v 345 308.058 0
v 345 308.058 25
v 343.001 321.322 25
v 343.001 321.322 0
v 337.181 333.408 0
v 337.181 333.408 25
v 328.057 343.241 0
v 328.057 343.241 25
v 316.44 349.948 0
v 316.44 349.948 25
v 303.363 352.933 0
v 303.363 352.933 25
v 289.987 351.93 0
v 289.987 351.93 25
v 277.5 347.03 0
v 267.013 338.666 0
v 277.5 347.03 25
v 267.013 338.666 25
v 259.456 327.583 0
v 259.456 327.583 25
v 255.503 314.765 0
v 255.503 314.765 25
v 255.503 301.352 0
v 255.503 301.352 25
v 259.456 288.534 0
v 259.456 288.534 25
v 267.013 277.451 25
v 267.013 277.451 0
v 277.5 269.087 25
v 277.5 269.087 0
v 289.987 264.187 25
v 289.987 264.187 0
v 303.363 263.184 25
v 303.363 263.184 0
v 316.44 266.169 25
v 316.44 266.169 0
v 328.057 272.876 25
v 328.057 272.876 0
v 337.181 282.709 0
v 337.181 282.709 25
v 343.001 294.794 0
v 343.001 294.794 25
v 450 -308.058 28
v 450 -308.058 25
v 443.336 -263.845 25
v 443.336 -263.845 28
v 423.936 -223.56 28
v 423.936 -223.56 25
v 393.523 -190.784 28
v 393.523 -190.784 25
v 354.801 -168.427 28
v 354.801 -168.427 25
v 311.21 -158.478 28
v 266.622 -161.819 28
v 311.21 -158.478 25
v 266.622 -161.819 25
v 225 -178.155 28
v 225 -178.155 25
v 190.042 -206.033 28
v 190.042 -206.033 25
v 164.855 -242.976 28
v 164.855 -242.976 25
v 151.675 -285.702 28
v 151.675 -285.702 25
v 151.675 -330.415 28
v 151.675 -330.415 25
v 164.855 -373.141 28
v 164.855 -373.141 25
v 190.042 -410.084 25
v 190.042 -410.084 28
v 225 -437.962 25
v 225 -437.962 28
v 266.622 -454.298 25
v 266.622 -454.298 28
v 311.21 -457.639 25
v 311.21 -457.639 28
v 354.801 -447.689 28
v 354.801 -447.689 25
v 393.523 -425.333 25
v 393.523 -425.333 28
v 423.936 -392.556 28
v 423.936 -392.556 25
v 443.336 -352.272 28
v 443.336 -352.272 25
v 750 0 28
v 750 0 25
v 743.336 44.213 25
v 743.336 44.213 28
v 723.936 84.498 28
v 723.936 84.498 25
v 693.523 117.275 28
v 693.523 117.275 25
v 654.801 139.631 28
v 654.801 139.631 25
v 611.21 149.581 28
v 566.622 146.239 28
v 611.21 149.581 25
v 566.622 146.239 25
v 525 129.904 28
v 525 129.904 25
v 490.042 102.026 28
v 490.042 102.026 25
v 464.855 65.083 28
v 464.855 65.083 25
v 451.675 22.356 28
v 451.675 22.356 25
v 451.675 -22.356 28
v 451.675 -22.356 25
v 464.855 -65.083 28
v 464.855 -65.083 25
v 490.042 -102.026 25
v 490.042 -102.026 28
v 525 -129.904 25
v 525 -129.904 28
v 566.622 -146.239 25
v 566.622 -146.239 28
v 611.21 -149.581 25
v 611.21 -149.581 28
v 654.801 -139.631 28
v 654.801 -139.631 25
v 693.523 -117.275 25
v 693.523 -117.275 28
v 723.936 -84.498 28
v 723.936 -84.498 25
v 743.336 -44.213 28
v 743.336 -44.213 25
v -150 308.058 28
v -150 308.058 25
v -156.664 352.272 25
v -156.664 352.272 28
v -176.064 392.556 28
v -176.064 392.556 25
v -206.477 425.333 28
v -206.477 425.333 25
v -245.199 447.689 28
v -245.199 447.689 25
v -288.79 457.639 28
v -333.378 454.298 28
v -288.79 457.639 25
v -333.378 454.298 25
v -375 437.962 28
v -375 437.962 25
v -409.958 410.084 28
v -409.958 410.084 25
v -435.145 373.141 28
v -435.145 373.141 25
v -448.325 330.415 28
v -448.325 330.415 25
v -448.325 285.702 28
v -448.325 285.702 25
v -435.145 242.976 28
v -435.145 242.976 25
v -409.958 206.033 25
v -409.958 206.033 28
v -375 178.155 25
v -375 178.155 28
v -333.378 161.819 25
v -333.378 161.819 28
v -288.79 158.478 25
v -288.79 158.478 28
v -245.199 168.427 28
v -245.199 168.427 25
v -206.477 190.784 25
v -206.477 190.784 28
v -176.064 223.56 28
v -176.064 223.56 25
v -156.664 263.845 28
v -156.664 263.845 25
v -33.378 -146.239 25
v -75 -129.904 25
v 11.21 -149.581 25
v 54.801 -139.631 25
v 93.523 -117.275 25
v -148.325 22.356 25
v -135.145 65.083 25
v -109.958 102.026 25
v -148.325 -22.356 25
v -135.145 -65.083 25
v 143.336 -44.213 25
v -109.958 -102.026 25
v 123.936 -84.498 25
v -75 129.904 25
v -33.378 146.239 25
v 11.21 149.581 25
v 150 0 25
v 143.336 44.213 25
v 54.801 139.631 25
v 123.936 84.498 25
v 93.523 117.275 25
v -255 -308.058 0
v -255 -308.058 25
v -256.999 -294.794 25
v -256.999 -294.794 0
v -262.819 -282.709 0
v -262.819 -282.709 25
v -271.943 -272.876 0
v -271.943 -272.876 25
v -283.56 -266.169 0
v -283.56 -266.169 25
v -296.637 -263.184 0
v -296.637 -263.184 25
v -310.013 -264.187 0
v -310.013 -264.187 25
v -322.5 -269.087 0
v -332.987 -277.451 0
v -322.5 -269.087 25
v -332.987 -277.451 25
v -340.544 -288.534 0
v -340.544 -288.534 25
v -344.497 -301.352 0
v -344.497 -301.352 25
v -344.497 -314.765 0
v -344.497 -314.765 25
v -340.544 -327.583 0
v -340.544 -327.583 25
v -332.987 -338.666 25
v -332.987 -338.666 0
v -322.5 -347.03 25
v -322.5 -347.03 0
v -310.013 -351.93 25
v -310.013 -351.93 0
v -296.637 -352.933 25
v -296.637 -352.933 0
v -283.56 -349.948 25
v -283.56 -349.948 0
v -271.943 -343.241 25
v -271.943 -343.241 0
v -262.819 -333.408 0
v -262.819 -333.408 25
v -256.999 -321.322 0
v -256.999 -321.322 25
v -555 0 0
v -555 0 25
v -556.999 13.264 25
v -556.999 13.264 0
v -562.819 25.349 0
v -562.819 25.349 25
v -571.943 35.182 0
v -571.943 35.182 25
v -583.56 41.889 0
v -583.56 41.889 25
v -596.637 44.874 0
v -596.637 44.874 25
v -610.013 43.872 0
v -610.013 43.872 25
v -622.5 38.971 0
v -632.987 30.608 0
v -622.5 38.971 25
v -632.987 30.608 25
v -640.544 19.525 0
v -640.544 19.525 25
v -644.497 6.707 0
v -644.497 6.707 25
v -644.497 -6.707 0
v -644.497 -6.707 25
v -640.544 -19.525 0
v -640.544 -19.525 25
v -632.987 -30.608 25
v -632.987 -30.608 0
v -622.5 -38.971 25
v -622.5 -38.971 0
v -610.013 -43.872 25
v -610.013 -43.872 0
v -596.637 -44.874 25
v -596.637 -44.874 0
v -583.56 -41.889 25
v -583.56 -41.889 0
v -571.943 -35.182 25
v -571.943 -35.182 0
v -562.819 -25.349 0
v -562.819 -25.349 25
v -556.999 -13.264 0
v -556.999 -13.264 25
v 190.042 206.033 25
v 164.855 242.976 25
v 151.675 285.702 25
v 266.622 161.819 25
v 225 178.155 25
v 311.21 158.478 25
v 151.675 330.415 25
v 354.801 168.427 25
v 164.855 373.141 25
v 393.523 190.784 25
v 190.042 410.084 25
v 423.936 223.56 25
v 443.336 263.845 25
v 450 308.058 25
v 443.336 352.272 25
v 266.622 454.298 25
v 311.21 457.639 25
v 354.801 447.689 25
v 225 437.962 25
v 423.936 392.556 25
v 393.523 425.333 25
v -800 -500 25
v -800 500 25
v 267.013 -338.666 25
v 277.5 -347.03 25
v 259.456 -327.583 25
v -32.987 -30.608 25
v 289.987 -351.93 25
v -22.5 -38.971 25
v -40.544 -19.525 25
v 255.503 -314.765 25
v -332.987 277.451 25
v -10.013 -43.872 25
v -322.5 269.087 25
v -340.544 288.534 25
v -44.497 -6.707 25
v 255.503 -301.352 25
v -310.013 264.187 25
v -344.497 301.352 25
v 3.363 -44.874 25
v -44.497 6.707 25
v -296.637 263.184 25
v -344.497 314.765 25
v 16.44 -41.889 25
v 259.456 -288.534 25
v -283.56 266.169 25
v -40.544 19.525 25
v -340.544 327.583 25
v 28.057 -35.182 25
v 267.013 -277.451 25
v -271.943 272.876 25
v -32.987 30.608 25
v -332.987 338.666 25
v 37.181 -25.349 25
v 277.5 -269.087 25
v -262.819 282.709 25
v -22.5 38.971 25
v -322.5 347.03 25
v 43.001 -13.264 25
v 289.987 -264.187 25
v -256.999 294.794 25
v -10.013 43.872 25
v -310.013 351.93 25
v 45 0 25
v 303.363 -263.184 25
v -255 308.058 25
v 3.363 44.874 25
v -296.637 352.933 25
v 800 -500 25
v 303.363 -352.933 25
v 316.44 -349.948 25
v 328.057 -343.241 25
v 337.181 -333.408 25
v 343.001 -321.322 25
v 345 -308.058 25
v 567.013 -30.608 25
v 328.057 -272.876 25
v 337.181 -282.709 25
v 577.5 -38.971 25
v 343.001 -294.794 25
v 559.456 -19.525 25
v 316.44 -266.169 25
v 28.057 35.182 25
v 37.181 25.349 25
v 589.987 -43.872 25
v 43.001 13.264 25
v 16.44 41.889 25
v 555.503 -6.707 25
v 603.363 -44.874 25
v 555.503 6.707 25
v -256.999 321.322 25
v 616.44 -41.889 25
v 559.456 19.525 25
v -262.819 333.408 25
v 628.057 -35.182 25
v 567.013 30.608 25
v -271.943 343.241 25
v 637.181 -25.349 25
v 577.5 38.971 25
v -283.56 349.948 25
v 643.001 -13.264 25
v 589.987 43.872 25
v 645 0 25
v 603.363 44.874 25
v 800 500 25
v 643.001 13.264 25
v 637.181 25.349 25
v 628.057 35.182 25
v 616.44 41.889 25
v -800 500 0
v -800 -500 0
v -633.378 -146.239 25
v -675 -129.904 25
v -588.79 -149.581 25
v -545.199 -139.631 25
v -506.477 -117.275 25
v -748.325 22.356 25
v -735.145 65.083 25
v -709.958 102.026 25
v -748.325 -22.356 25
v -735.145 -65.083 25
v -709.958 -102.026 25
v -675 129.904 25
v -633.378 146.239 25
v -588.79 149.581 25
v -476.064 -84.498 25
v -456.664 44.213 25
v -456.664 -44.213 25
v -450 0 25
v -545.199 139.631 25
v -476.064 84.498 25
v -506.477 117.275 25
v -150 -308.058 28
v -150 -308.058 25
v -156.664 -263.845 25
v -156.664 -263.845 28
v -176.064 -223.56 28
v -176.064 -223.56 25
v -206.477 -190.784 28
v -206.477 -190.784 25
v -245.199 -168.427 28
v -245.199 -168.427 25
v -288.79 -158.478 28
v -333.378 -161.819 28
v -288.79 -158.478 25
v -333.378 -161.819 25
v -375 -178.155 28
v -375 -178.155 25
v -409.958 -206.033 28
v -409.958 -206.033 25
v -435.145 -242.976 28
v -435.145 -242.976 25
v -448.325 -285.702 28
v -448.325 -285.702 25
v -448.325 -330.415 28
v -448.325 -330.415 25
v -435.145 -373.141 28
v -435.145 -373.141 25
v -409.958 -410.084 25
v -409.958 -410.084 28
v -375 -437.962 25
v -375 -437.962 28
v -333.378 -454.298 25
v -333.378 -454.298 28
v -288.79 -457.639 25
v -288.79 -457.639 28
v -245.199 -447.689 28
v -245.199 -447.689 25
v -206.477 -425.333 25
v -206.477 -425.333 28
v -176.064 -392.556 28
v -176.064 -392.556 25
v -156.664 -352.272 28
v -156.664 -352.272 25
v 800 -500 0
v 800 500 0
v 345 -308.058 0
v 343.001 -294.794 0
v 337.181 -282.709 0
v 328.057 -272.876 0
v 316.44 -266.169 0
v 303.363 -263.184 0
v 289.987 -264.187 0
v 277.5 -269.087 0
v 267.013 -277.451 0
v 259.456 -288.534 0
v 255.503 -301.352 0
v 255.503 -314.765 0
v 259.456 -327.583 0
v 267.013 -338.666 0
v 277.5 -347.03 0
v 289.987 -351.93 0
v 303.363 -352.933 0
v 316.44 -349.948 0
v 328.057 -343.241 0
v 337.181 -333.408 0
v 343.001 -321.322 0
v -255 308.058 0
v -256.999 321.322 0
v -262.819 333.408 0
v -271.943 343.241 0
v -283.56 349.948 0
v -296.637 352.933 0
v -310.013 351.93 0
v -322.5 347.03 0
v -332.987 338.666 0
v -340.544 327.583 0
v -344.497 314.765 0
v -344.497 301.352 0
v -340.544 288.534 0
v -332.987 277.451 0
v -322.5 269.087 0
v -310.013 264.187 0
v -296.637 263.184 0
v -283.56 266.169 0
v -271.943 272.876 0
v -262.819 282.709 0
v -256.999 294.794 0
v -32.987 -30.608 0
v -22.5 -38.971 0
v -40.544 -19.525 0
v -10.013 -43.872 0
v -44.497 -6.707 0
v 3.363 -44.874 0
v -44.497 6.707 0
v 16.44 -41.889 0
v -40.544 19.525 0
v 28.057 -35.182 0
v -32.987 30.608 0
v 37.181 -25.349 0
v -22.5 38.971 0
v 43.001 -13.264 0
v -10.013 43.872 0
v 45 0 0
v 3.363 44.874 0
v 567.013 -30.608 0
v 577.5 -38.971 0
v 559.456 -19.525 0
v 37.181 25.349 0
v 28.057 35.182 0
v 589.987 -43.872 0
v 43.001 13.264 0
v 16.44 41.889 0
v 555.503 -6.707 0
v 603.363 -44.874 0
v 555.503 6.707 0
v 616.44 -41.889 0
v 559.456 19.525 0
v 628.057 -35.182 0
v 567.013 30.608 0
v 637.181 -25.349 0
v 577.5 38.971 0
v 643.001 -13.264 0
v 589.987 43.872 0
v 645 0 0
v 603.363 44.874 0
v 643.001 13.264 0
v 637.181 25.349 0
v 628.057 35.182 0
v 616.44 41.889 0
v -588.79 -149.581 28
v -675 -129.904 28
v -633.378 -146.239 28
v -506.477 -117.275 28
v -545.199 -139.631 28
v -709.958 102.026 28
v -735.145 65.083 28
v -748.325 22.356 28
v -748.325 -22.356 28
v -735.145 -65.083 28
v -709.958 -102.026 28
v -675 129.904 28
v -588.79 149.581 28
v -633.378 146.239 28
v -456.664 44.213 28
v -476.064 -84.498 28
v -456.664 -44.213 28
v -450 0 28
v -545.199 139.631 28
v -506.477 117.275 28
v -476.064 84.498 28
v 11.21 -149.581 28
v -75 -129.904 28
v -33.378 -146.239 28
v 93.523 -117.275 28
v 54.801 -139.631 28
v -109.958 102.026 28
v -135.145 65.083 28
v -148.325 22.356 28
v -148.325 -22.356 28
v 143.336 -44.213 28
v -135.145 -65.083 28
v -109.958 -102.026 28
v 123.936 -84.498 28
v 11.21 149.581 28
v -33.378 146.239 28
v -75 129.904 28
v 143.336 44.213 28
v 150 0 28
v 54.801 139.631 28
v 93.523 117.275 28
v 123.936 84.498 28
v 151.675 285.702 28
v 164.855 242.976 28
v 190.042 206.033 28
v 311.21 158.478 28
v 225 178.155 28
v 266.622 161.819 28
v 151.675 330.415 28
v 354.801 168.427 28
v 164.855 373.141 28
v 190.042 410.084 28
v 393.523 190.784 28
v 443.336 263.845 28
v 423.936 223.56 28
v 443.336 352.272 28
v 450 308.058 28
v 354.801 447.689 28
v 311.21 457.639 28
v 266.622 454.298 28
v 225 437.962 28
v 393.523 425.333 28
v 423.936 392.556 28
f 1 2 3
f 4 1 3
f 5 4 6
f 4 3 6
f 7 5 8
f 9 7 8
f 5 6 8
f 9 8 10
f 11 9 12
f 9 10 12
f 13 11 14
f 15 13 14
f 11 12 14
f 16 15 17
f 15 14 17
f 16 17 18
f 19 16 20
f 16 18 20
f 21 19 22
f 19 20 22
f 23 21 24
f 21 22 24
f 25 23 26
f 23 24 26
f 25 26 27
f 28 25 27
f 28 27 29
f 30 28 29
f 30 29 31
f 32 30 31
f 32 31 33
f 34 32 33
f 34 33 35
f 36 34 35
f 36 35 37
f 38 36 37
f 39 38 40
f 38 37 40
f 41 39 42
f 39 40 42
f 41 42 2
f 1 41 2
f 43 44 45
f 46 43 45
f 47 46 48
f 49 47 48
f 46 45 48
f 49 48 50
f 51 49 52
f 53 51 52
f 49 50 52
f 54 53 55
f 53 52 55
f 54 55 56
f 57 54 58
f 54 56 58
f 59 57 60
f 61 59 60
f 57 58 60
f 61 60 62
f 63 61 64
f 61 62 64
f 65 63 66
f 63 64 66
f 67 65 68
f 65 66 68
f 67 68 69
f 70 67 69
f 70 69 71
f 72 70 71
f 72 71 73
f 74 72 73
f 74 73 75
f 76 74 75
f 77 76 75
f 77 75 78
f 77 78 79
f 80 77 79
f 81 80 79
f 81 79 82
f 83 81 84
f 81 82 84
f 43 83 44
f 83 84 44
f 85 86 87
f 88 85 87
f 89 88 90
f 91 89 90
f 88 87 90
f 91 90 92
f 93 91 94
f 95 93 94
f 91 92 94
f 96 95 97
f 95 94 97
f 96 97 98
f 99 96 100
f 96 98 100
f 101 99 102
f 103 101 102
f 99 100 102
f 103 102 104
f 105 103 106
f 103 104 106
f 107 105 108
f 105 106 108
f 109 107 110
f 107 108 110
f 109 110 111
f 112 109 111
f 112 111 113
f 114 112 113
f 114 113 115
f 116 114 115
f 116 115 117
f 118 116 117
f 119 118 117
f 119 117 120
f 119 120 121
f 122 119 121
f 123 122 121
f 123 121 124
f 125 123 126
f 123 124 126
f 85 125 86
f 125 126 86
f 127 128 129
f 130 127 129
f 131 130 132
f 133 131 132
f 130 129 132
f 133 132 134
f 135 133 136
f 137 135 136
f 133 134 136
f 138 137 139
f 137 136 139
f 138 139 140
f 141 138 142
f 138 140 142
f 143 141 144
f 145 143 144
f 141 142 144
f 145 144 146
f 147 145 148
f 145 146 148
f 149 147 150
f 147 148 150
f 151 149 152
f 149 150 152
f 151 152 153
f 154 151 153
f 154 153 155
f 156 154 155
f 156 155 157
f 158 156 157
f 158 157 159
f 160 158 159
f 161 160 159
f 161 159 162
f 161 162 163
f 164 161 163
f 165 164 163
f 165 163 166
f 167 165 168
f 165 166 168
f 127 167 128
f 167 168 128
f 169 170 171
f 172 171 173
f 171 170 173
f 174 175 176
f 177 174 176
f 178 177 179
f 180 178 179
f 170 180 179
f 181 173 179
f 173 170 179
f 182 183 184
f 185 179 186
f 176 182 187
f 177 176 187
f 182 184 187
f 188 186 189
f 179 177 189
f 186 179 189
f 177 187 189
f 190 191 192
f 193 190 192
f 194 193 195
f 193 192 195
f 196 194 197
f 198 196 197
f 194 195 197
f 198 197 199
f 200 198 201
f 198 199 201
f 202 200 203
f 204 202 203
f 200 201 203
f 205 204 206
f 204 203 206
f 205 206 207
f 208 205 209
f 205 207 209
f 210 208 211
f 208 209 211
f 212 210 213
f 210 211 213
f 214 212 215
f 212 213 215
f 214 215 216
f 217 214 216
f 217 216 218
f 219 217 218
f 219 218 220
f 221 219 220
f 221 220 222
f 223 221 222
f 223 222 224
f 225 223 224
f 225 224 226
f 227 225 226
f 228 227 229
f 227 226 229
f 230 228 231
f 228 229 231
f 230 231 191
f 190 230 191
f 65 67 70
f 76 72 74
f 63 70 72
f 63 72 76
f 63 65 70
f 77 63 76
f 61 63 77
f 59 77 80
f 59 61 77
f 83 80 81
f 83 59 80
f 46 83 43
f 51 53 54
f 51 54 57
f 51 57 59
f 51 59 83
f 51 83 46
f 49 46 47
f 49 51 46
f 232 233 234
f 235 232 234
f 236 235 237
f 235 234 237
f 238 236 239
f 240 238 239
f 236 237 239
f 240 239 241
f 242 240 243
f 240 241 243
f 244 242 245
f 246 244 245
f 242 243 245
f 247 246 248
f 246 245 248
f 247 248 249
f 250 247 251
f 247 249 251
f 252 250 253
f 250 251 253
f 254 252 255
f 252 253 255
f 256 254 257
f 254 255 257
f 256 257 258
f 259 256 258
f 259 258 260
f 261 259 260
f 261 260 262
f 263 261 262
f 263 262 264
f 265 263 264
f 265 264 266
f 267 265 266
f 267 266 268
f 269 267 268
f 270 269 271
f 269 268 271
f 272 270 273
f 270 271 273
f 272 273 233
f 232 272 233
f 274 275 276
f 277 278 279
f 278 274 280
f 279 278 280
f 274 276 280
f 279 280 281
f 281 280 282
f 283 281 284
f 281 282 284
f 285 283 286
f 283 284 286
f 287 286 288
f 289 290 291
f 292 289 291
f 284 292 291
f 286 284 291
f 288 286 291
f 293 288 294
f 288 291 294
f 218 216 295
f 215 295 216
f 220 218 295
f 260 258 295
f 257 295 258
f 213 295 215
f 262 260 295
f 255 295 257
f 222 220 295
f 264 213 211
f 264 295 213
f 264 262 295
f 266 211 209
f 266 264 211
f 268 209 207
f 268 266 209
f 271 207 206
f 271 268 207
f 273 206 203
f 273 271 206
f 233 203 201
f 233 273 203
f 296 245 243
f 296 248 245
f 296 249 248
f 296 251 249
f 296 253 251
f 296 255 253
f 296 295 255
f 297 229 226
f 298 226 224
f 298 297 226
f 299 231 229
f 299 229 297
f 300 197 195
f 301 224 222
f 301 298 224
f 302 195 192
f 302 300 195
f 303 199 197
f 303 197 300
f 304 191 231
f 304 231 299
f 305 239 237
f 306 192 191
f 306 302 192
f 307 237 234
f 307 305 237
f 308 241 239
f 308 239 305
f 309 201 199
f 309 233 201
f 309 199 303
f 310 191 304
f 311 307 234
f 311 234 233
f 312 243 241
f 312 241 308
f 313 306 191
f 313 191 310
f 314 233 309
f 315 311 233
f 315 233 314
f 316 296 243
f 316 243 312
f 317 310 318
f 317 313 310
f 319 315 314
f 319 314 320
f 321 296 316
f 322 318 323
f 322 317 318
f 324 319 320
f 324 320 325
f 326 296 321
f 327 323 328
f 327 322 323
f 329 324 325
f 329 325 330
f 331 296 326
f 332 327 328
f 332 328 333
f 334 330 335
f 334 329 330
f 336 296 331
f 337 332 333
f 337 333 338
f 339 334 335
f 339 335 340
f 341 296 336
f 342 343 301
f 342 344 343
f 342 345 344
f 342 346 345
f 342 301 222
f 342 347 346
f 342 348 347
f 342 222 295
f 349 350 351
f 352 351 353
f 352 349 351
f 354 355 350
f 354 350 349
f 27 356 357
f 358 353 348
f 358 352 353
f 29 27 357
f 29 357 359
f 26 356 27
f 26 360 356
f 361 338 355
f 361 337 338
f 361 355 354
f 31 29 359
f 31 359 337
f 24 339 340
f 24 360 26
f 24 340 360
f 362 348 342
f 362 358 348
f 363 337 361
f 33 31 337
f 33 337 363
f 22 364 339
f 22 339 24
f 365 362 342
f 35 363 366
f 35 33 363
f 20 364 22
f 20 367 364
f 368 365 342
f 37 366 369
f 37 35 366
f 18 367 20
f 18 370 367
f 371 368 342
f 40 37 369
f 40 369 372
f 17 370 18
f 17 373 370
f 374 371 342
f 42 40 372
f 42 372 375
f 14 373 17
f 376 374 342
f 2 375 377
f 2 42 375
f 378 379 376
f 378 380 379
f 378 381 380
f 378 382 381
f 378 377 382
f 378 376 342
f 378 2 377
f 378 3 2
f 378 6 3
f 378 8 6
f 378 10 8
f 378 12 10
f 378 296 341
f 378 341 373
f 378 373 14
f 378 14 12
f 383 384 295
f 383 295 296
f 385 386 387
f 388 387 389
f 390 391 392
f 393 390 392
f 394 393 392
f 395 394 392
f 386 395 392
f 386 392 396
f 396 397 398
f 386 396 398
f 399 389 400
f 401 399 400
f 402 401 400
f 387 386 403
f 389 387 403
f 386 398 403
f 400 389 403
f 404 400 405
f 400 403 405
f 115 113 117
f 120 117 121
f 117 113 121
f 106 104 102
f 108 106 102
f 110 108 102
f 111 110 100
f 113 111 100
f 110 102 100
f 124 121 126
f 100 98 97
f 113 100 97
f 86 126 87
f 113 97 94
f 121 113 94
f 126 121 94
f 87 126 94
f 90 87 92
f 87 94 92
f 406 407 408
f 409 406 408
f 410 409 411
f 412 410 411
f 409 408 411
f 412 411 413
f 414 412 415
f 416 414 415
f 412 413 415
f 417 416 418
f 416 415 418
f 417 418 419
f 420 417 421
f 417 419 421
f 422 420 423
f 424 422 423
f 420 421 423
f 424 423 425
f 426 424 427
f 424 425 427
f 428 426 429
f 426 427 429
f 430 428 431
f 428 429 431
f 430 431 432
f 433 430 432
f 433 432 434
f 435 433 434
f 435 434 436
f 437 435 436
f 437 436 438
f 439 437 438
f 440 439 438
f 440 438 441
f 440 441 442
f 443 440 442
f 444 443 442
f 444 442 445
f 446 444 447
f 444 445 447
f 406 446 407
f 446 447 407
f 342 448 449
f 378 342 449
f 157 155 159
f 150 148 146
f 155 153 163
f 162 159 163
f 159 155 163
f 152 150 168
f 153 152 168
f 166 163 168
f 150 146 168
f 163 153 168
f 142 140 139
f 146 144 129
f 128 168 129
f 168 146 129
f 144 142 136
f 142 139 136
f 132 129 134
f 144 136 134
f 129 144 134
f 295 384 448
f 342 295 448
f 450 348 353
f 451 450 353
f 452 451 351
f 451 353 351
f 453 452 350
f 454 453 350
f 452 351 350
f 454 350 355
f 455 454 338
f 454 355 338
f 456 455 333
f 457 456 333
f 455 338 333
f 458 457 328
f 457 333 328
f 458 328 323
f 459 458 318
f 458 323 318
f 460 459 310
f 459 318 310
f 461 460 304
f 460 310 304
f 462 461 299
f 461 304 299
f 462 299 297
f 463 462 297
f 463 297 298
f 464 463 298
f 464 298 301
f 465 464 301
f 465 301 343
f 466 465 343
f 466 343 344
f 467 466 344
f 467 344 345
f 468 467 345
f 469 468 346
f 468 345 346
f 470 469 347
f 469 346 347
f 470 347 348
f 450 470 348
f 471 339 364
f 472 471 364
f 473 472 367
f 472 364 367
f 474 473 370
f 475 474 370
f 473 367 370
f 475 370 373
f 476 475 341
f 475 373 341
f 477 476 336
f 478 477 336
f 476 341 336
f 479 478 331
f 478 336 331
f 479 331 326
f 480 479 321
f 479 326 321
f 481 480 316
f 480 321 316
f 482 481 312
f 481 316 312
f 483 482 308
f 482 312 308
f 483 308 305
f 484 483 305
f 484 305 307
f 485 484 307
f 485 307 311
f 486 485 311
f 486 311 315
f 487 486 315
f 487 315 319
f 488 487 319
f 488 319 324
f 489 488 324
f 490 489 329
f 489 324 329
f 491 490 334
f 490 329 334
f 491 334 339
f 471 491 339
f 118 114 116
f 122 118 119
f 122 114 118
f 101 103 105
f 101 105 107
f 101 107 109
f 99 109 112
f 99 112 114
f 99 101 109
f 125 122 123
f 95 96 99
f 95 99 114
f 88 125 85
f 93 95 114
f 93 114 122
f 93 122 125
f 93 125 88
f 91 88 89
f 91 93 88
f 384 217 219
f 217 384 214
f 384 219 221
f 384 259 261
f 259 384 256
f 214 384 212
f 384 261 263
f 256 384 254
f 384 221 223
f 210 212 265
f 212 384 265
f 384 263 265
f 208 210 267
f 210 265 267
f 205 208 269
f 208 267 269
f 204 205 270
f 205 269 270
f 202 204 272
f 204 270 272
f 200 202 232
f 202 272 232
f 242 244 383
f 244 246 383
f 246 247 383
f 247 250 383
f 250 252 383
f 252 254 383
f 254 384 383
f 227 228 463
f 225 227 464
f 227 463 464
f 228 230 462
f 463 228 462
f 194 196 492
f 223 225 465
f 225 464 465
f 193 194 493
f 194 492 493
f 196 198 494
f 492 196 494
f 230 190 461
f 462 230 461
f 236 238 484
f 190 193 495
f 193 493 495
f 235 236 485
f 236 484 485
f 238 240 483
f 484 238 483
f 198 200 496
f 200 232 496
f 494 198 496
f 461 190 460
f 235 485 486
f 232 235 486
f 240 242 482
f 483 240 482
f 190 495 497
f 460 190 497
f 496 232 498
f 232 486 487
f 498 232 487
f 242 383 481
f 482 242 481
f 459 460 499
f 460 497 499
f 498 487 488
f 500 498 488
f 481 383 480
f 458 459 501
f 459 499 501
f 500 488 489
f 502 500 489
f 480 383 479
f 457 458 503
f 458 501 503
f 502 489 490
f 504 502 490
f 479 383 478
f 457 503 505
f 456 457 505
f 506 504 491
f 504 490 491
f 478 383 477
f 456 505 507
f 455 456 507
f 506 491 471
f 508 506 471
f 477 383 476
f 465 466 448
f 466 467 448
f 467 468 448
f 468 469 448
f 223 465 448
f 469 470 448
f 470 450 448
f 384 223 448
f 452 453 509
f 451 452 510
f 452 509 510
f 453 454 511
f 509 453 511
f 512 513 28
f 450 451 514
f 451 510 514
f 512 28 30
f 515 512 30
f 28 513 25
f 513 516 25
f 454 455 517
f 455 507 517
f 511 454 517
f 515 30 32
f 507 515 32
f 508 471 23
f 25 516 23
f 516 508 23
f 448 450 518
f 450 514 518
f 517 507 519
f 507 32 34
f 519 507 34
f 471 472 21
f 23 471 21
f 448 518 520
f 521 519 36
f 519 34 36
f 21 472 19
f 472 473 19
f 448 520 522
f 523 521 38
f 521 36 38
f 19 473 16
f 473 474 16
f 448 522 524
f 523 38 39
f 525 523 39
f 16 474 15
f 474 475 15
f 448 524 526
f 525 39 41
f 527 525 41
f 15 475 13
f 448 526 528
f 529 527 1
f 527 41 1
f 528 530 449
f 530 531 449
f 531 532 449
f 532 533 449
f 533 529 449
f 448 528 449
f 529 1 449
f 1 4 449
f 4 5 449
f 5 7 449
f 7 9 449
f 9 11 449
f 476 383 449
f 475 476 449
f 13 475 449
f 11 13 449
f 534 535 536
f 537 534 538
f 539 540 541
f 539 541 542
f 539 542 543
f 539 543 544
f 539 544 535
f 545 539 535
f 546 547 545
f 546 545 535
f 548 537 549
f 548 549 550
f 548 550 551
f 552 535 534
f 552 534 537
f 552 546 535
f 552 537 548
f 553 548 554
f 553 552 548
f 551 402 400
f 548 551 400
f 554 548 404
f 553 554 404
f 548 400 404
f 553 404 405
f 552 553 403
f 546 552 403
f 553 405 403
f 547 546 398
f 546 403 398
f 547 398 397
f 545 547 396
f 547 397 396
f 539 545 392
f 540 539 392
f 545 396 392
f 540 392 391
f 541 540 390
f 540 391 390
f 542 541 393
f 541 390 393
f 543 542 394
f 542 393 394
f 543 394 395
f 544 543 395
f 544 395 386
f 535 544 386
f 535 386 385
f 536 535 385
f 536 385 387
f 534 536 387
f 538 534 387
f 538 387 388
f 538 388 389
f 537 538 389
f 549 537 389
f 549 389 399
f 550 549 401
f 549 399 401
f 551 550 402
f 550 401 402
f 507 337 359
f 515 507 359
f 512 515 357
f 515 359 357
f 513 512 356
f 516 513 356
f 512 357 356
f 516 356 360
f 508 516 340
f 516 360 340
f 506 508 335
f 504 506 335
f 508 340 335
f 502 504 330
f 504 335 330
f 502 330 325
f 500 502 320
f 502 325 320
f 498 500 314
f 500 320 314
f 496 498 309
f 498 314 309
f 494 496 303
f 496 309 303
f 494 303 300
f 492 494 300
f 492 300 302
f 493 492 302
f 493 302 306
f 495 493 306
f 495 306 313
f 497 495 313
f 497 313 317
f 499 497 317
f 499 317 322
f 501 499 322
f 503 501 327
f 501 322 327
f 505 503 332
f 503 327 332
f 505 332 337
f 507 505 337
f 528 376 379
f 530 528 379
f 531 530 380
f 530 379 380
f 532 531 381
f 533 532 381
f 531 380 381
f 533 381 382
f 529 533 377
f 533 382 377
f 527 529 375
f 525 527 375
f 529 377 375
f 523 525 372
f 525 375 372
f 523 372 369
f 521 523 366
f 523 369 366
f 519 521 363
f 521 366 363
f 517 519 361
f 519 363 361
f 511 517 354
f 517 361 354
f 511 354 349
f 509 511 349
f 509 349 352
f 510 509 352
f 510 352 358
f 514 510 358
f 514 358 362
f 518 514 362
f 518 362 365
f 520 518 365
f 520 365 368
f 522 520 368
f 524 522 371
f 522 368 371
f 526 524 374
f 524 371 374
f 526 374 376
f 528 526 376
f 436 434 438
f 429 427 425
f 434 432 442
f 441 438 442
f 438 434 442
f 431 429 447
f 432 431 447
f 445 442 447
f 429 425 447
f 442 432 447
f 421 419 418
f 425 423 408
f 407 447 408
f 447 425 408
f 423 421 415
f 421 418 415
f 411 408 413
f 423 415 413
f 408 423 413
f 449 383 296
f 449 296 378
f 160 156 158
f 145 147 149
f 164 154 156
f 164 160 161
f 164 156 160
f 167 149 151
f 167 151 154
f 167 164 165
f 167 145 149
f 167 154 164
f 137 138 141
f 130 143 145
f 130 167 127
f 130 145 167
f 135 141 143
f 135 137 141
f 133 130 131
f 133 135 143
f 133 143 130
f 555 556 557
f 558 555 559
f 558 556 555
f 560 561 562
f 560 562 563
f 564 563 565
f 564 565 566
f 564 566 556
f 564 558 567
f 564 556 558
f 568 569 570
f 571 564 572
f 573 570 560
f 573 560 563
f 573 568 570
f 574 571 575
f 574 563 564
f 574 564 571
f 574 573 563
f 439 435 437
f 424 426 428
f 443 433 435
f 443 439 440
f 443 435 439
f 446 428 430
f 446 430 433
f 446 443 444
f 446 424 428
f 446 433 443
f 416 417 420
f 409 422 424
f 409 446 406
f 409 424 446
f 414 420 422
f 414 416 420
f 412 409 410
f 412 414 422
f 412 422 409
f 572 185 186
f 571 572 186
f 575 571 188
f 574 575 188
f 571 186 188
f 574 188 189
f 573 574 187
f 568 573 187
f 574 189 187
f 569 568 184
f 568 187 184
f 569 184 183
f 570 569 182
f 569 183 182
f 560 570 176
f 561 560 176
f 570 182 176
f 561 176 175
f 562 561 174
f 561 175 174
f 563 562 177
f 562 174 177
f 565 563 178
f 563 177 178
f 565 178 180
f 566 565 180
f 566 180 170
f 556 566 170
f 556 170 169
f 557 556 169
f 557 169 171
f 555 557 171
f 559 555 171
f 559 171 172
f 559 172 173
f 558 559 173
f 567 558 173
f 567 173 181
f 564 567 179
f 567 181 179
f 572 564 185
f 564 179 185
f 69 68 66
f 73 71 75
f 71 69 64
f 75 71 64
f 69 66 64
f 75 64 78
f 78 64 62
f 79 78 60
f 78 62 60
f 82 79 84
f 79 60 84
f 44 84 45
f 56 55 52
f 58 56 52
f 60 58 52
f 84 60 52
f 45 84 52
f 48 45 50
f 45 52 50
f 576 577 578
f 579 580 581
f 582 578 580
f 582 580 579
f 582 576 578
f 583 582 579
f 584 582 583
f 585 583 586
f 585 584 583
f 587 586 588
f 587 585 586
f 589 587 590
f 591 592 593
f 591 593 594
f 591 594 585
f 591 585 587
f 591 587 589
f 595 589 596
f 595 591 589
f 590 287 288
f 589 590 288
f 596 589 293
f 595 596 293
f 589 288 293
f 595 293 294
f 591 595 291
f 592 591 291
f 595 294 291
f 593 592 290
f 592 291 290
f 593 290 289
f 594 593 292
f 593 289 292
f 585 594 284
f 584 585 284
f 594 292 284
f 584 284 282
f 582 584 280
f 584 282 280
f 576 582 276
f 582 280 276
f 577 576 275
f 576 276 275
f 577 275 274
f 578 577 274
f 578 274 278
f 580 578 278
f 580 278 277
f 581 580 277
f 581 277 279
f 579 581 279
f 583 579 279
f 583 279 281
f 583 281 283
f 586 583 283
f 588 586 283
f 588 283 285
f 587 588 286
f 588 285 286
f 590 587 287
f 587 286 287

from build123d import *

# Parameters (mm, degrees)
F0_W     = 1600
F0_H     = 1000
F1_DEPTH = 25
F2_R     = 45
F3_DEPTH = 25
F2_R_2   = 150
F4_DEPTH = 3


with BuildPart() as f1:
    # F0 (on Top) → F1 (new body)
    with BuildSketch(Plane.XY):
        Rectangle(F0_W, F0_H)
    extrude(amount=F1_DEPTH)

    # F2 (on face) → F3 (cut)
    with BuildSketch(Plane.XY.offset(25)):
        with Locations((-600, 0)):
            Circle(F2_R)
        with Locations((-300, 308.058436015)):
            Circle(F2_R)
        with Locations((300, 308.058436015)):
            Circle(F2_R)
        with Locations((600, 0)):
            Circle(F2_R)
        Circle(F2_R)
        with Locations((300, -308.058436015)):
            Circle(F2_R)
        with Locations((-300, -308.058436015)):
            Circle(F2_R)
    extrude(amount=-F3_DEPTH, mode=Mode.SUBTRACT)


with BuildPart() as f4:
    # F2 (on face) → F4 (new body)
    with BuildSketch(Plane.XY.offset(25)):
        with Locations((-600, 0)):
            Circle(F2_R_2)
        with Locations((-600, 0)):
            Circle(F2_R, mode=Mode.SUBTRACT)
        with Locations((-600, 0)):
            Circle(F2_R)
    extrude(amount=F4_DEPTH)


with BuildPart() as f4b:
    # F2 (on face) → F4, piece 2 (new body)
    with BuildSketch(Plane.XY.offset(25)):
        with Locations((-300, 308.058436015)):
            Circle(F2_R_2)
        with Locations((-300, 308.058436015)):
            Circle(F2_R, mode=Mode.SUBTRACT)
        with Locations((-300, 308.058436015)):
            Circle(F2_R)
    extrude(amount=F4_DEPTH)


with BuildPart() as f4c:
    # F2 (on face) → F4, piece 3 (new body)
    with BuildSketch(Plane.XY.offset(25)):
        Circle(F2_R_2)
        Circle(F2_R, mode=Mode.SUBTRACT)
        Circle(F2_R)
    extrude(amount=F4_DEPTH)


with BuildPart() as f4d:
    # F2 (on face) → F4, piece 4 (new body)
    with BuildSketch(Plane.XY.offset(25)):
        with Locations((300, 308.058436015)):
            Circle(F2_R_2)
        with Locations((300, 308.058436015)):
            Circle(F2_R, mode=Mode.SUBTRACT)
        with Locations((300, 308.058436015)):
            Circle(F2_R)
    extrude(amount=F4_DEPTH)


with BuildPart() as f4e:
    # F2 (on face) → F4, piece 5 (new body)
    with BuildSketch(Plane.XY.offset(25)):
        with Locations((300, -308.058436015)):
            Circle(F2_R_2)
        with Locations((300, -308.058436015)):
            Circle(F2_R, mode=Mode.SUBTRACT)
        with Locations((300, -308.058436015)):
            Circle(F2_R)
    extrude(amount=F4_DEPTH)


with BuildPart() as f4f:
    # F2 (on face) → F4, piece 6 (new body)
    with BuildSketch(Plane.XY.offset(25)):
        with Locations((-300, -308.058436015)):
            Circle(F2_R_2)
        with Locations((-300, -308.058436015)):
            Circle(F2_R, mode=Mode.SUBTRACT)
        with Locations((-300, -308.058436015)):
            Circle(F2_R)
    extrude(amount=F4_DEPTH)


with BuildPart() as f4g:
    # F2 (on face) → F4, piece 7 (new body)
    with BuildSketch(Plane.XY.offset(25)):
        with Locations((600, 0)):
            Circle(F2_R_2)
        with Locations((600, 0)):
            Circle(F2_R, mode=Mode.SUBTRACT)
        with Locations((600, 0)):
            Circle(F2_R)
    extrude(amount=F4_DEPTH)


solid = Compound([f1.part, f4.part, f4b.part, f4c.part, f4d.part, f4e.part, f4f.part, f4g.part])
